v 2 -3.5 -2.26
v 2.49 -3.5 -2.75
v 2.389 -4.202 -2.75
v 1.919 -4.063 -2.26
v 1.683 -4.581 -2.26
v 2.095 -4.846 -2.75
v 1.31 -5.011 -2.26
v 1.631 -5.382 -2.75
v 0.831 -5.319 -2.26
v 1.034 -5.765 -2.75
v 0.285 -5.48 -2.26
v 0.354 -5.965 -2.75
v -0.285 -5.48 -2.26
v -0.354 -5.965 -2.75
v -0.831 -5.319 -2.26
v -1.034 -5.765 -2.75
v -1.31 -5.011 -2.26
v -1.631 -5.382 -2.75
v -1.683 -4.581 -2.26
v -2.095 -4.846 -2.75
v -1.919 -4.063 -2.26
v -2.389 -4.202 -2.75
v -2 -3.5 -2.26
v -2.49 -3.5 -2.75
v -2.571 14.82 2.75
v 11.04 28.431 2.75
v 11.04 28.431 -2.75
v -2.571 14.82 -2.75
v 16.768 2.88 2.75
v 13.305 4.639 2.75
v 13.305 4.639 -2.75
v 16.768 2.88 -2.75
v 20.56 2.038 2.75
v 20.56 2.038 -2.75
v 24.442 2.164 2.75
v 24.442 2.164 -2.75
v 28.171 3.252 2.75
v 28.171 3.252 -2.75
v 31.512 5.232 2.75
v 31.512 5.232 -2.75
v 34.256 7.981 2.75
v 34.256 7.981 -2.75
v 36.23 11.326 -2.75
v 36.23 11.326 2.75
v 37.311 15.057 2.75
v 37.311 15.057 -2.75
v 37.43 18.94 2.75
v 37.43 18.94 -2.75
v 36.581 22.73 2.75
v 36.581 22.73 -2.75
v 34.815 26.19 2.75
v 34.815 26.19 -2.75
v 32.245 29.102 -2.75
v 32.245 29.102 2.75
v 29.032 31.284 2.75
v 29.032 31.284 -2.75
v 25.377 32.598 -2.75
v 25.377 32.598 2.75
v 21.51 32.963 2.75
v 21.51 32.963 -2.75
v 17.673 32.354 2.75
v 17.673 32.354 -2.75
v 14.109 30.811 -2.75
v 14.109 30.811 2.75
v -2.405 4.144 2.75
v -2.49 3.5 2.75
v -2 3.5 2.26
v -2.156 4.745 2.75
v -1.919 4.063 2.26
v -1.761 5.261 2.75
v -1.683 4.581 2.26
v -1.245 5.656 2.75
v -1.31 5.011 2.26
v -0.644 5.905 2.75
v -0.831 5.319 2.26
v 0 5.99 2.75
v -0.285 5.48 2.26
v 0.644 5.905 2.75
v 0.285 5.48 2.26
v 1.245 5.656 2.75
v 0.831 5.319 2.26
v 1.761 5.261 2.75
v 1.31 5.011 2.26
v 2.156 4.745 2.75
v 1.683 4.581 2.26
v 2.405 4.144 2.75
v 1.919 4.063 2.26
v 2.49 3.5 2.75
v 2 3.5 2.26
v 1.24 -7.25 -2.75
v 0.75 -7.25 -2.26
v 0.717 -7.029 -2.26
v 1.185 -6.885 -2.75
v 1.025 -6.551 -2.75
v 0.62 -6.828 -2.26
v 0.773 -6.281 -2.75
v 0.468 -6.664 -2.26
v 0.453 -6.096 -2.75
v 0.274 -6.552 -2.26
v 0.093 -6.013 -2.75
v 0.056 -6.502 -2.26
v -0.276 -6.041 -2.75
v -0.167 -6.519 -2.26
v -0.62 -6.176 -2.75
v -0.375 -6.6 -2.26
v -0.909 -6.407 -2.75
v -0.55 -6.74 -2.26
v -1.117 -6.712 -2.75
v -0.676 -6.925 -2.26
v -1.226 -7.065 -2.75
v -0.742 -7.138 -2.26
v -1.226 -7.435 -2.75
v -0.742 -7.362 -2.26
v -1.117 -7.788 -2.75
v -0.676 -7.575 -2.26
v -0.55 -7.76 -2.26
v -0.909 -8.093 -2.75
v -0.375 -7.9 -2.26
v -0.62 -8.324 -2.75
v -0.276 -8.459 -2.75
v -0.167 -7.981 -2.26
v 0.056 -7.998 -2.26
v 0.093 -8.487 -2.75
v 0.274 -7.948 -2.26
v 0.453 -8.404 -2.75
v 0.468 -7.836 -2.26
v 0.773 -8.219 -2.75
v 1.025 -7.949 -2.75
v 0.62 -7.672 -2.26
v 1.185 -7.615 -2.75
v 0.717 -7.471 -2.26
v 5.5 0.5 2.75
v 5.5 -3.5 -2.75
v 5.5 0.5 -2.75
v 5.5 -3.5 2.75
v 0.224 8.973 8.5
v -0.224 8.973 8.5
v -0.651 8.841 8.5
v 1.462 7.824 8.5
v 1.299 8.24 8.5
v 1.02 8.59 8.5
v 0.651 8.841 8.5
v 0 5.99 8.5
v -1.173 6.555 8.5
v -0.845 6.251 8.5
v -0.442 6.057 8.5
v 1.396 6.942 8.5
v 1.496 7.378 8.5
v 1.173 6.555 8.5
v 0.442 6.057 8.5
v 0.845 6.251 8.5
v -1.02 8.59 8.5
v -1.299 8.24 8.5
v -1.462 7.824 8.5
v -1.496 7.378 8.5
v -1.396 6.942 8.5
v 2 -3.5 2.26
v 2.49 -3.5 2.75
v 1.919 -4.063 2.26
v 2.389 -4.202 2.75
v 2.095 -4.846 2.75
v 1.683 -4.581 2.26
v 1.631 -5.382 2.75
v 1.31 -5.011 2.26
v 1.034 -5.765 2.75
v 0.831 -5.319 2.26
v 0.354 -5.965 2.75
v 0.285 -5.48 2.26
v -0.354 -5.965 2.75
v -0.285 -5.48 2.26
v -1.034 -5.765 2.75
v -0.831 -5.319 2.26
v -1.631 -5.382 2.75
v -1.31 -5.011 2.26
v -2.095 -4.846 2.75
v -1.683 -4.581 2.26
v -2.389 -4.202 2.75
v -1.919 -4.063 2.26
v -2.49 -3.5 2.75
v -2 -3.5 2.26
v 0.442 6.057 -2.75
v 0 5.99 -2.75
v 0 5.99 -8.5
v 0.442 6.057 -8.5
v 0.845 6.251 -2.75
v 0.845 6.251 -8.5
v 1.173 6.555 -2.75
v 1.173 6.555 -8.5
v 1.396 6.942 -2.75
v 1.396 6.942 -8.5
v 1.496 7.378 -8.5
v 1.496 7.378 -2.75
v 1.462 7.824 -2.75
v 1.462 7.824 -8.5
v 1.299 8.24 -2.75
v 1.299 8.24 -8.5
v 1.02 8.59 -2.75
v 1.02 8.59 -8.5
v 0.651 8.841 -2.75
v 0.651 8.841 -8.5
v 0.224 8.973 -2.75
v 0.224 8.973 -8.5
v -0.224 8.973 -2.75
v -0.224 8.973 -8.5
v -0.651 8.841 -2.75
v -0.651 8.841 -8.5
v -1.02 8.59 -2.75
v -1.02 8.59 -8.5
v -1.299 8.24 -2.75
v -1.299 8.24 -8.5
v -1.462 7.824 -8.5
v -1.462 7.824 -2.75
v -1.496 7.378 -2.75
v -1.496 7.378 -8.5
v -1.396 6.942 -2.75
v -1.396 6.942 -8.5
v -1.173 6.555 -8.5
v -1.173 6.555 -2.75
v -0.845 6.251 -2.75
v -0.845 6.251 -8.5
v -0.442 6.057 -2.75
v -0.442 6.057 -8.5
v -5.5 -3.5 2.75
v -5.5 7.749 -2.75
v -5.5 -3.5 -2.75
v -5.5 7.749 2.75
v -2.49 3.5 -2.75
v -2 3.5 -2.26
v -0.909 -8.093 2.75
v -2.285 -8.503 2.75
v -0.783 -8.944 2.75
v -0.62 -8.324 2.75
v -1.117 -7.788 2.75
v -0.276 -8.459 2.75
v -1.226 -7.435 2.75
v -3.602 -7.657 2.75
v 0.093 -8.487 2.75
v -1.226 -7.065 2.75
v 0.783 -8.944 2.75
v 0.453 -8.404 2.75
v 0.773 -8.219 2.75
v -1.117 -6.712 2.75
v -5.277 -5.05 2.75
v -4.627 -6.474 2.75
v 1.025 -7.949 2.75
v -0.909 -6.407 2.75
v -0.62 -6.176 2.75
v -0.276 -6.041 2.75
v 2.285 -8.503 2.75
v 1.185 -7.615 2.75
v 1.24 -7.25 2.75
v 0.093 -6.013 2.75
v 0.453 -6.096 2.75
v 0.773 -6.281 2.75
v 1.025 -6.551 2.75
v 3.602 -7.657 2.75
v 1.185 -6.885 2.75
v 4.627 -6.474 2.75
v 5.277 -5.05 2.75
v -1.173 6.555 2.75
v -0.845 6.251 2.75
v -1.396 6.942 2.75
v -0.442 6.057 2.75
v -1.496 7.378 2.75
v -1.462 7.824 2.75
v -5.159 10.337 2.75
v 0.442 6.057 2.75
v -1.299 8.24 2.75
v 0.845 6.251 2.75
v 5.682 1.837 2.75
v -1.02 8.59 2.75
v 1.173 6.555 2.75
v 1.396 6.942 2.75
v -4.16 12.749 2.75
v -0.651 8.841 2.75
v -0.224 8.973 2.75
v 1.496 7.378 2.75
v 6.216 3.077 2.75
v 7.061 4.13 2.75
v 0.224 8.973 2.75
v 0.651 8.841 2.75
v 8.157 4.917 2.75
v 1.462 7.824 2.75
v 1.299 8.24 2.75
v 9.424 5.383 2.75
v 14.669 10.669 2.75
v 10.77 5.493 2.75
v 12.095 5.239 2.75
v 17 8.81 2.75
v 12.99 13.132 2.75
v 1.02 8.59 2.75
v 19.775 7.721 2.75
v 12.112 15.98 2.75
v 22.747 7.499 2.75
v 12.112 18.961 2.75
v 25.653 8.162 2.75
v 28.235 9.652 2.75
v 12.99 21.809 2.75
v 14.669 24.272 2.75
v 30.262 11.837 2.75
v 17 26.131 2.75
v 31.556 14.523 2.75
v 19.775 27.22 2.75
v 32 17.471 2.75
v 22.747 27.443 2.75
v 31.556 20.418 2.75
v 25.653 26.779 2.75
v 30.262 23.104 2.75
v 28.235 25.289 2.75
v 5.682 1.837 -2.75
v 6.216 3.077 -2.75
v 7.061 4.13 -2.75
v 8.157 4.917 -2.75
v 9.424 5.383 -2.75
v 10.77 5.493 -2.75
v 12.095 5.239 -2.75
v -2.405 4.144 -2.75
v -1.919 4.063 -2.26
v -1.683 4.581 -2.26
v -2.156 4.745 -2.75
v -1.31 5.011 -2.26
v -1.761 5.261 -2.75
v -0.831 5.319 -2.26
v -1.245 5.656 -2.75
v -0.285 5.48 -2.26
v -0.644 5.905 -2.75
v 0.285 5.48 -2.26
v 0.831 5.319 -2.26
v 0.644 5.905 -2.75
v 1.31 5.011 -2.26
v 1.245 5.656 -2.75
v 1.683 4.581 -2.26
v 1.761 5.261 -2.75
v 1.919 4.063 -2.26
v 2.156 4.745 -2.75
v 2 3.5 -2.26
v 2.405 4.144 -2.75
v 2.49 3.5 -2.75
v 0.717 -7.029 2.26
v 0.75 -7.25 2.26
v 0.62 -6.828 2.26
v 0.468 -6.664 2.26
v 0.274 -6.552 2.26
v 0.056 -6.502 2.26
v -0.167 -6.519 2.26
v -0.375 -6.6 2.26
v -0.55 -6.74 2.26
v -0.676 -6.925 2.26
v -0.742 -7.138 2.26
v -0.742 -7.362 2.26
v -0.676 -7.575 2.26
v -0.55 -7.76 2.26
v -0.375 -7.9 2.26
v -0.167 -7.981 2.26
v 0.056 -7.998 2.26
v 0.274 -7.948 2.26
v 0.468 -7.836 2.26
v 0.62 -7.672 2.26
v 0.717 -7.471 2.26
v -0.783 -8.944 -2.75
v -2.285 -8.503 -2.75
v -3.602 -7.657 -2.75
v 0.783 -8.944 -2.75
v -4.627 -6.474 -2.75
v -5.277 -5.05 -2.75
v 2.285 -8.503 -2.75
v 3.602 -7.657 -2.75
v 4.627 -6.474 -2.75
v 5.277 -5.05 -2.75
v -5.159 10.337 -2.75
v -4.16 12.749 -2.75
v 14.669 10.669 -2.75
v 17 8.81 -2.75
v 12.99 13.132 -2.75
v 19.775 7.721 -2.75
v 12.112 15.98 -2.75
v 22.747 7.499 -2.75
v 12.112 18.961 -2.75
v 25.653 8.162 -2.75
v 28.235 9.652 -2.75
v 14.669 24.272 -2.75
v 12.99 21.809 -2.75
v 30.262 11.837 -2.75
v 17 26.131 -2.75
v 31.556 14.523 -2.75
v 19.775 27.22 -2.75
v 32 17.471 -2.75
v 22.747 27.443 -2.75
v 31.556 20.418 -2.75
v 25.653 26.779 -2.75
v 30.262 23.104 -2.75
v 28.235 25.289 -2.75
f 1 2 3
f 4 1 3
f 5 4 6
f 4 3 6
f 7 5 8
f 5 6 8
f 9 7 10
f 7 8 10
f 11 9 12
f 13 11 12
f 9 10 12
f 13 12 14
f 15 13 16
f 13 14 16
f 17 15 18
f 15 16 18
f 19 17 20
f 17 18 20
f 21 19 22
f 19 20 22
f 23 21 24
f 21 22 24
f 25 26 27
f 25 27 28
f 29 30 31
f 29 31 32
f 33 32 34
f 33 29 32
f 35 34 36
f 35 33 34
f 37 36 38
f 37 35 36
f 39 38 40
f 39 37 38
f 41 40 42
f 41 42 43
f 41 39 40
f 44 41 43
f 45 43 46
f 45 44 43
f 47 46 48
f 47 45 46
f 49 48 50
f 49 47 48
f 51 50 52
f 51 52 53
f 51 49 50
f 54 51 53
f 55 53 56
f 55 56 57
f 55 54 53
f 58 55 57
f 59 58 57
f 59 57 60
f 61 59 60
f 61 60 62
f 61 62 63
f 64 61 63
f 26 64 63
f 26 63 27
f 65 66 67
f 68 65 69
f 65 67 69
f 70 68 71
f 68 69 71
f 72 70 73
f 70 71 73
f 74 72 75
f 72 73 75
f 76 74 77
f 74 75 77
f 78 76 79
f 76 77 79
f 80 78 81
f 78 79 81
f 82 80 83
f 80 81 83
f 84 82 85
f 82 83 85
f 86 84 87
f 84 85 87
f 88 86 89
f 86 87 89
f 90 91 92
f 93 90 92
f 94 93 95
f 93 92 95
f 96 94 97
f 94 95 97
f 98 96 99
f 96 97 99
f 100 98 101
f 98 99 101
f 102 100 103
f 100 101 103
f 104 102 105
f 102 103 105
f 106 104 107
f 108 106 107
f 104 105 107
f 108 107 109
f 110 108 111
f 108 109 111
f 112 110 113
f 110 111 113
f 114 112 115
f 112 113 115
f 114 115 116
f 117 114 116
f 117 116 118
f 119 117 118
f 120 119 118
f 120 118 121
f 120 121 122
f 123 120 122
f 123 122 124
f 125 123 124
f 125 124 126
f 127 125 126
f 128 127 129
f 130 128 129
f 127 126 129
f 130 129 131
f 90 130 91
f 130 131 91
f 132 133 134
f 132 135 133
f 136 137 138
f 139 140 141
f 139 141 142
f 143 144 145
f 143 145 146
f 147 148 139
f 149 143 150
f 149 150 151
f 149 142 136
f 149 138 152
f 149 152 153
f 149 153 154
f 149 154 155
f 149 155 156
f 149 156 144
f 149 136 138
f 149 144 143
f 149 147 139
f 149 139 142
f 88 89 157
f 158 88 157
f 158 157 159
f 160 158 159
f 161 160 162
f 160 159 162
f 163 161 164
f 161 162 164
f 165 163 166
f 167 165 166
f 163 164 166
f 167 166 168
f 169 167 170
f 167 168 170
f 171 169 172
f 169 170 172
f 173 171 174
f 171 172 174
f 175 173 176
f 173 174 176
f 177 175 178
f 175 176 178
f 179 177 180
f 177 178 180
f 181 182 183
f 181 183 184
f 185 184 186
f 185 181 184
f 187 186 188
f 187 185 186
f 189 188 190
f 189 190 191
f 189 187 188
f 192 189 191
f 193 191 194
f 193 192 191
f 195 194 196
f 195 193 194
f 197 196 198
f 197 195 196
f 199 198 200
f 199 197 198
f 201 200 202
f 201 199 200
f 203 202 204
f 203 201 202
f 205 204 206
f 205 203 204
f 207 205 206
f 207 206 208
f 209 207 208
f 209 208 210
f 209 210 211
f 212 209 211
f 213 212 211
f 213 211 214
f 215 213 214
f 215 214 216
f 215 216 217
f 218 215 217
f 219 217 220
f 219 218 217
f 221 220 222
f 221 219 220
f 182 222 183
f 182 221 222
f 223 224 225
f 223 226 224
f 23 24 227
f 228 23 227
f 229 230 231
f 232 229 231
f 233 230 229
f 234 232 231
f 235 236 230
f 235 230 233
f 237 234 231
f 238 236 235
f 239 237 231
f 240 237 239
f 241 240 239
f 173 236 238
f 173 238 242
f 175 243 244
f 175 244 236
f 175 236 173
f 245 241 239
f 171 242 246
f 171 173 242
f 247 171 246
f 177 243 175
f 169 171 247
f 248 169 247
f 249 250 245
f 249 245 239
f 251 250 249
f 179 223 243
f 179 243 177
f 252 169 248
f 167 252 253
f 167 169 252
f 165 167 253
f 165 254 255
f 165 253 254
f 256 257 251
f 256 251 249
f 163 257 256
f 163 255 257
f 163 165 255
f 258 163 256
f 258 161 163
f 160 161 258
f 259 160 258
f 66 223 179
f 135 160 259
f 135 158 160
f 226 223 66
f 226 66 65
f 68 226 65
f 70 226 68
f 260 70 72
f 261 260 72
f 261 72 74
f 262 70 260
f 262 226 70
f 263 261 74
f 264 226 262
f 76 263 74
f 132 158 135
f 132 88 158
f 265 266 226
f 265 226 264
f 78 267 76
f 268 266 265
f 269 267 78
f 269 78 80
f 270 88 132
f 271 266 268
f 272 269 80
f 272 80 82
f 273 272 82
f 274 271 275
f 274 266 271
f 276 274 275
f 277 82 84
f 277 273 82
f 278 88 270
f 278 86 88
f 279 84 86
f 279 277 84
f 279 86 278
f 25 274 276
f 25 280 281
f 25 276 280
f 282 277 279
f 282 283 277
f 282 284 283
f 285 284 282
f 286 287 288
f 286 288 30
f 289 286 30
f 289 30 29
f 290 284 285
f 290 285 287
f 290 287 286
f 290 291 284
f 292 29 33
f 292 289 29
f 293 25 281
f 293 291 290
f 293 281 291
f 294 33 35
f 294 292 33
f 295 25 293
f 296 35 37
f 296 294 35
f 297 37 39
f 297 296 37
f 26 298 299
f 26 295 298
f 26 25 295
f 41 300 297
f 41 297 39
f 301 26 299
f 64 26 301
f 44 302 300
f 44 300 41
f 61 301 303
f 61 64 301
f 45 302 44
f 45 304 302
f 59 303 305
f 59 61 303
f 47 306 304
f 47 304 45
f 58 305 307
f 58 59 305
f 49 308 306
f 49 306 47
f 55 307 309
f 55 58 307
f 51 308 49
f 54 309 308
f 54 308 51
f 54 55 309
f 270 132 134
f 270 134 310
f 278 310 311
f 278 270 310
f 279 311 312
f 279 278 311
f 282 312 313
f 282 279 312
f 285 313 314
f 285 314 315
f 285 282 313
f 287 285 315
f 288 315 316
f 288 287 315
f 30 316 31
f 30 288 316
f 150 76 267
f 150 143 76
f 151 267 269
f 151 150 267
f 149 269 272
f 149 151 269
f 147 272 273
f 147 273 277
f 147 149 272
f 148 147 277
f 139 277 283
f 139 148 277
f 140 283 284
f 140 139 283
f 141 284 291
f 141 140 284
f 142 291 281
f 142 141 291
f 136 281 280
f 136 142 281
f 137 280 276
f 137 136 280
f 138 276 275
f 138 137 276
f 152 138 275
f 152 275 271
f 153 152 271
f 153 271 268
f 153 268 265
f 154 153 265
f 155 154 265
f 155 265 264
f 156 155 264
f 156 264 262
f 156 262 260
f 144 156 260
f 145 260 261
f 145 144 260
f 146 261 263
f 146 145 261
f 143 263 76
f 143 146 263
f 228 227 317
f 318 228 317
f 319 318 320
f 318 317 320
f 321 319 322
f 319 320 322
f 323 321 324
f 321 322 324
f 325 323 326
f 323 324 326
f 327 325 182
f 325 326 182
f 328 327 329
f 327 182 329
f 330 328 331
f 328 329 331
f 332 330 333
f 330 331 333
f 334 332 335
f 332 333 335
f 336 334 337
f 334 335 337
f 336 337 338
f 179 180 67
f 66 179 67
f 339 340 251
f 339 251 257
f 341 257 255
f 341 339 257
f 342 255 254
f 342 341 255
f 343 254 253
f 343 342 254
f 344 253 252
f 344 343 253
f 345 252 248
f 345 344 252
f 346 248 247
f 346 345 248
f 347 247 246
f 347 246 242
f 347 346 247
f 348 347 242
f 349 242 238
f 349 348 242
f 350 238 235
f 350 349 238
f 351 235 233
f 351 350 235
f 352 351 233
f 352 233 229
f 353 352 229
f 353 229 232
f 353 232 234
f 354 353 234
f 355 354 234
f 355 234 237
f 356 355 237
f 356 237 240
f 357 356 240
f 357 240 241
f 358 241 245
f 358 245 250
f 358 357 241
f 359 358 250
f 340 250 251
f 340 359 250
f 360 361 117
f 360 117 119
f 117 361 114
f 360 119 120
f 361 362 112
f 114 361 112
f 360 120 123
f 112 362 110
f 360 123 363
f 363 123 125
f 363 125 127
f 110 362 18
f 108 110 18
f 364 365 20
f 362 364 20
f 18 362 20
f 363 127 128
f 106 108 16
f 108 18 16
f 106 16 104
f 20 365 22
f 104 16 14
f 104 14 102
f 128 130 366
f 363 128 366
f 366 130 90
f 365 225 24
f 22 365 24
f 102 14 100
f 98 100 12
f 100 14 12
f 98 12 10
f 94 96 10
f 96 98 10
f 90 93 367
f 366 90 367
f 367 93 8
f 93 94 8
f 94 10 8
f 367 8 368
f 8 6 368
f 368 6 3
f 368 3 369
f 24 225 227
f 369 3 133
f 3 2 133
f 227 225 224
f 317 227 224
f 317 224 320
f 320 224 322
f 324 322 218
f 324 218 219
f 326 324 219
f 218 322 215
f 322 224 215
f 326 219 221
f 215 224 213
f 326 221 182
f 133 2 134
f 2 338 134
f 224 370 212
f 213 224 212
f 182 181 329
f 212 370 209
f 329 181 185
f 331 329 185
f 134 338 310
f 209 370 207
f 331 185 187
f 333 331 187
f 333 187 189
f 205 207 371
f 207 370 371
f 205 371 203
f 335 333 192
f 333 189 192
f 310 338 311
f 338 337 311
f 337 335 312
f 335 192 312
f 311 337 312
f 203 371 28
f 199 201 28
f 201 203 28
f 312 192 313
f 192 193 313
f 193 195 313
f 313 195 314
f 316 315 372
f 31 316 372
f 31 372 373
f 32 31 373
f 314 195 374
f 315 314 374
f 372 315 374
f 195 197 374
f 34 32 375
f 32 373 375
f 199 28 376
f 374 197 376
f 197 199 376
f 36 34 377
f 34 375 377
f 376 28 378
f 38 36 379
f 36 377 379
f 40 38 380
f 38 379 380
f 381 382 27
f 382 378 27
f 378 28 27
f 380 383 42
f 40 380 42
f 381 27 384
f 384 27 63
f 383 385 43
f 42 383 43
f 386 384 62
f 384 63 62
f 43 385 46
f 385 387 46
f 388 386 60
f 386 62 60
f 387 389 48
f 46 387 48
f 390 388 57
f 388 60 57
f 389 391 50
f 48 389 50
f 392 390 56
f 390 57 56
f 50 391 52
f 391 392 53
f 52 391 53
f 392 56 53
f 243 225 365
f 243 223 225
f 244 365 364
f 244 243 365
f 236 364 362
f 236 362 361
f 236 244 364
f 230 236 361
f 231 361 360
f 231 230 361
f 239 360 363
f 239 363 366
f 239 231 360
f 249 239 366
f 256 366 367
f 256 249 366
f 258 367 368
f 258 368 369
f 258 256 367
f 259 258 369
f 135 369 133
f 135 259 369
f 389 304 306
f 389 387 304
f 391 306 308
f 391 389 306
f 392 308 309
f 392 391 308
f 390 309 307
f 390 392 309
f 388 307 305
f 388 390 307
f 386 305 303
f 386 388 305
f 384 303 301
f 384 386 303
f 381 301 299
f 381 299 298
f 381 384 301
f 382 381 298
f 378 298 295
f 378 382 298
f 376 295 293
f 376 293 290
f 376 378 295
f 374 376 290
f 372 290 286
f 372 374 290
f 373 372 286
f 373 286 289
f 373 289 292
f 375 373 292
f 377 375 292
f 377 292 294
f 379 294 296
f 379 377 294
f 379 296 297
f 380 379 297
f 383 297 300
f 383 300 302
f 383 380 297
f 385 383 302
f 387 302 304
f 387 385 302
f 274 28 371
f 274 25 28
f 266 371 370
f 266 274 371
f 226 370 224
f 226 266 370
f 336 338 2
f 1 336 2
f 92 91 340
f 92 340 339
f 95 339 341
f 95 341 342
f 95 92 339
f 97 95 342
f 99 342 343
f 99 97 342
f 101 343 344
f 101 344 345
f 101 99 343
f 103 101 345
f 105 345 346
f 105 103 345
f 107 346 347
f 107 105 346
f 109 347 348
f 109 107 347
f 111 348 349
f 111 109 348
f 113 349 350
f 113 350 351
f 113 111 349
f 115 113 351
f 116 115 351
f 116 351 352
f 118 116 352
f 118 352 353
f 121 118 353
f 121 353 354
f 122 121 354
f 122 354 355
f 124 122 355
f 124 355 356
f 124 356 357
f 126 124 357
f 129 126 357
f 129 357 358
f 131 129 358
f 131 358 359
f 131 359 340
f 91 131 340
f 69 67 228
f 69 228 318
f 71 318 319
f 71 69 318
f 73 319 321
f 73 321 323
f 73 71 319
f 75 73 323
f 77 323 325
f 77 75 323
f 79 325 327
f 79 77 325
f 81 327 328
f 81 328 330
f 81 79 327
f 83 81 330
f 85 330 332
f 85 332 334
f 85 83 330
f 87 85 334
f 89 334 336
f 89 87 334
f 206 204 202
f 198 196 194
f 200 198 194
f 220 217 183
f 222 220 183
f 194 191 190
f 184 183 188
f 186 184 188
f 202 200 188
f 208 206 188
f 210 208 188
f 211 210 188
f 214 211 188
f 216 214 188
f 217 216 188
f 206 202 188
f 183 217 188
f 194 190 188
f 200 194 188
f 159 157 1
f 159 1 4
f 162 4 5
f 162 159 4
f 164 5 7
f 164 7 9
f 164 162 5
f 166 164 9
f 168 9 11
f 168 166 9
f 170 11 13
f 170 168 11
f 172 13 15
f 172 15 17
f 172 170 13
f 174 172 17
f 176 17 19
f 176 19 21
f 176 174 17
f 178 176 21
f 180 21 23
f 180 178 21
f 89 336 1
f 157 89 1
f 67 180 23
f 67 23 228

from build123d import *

# Parameters (mm, degrees)
ESQUISSE1_R        = 10
ESQUISSE1_R_2      = 0.75
BOSS_EXTRU_1_DEPTH = 2.75
CHANFREIN1_SIZE    = 0.49
CHANFREIN2_SIZE    = 0.49
ESQUISSE2_R        = 1.5
BOSS_EXTRU_2_DEPTH = 8.5


with BuildPart() as part:
    # Esquisse1 → Boss.-Extru.1 (new, symmetric)
    with BuildSketch(Plane.XY):
        with BuildLine():
            Line((5.5, -3.5), (5.5, 0.5))
            ThreePointArc((5.5, 0.5), (8.157393572, 4.917261043), (13.304878049, 4.639161646))
            ThreePointArc((13.304878049, 4.639161646), (37.430230582, 18.939570643), (11.039844892, 28.430717857))
            Line((11.039844892, 28.430717857), (-2.571067812, 14.819805153))
            ThreePointArc((-2.571067812, 14.819805153), (-4.738795325, 11.575571665), (-5.5, 7.748737342))
            Line((-5.5, 7.748737342), (-5.5, -3.5))
            ThreePointArc((-5.5, -3.5), (0, -9), (5.5, -3.5))
        make_face()
        with Locations((22, 17.470562748)):
            Circle(ESQUISSE1_R, mode=Mode.SUBTRACT)
        with Locations((0, -7.25)):
            Circle(ESQUISSE1_R_2, mode=Mode.SUBTRACT)
        with BuildLine():
            Line((2, 3.5), (2, -3.5))
            ThreePointArc((2, -3.5), (0, -5.5), (-2, -3.5))
            Line((-2, -3.5), (-2, 3.5))
            ThreePointArc((-2, 3.5), (0, 5.5), (2, 3.5))
        make_face(mode=Mode.SUBTRACT)
    extrude(amount=BOSS_EXTRU_1_DEPTH, both=True)

    # Chanfrein1
    chanfrein1_edges = [part.edges().sort_by_distance(p)[0] for p in [
        (0, 5.5, 2.75),
        (-2, 0, 2.75),
        (0, -5.5, 2.75),
        (2, 0, 2.75),
        (-0.75, -7.25, 2.75),
    ]]
    chamfer(chanfrein1_edges, length=CHANFREIN1_SIZE)

    # Chanfrein2
    chanfrein2_edges = [part.edges().sort_by_distance(p)[0] for p in [
        (0, 5.5, -2.75),
        (-2, 0, -2.75),
        (0, -5.5, -2.75),
        (2, 0, -2.75),
        (-0.75, -7.25, -2.75),
    ]]
    chamfer(chanfrein2_edges, length=CHANFREIN2_SIZE)

    # Esquisse2 → Boss.-Extru.2 (add, symmetric)
    with BuildSketch(Plane.XY):
        with Locations(Location((0, 7.49, 0), (0, 0, 270.000522617))):
            Circle(ESQUISSE2_R)
    extrude(amount=BOSS_EXTRU_2_DEPTH, both=True)


solid = part.part
